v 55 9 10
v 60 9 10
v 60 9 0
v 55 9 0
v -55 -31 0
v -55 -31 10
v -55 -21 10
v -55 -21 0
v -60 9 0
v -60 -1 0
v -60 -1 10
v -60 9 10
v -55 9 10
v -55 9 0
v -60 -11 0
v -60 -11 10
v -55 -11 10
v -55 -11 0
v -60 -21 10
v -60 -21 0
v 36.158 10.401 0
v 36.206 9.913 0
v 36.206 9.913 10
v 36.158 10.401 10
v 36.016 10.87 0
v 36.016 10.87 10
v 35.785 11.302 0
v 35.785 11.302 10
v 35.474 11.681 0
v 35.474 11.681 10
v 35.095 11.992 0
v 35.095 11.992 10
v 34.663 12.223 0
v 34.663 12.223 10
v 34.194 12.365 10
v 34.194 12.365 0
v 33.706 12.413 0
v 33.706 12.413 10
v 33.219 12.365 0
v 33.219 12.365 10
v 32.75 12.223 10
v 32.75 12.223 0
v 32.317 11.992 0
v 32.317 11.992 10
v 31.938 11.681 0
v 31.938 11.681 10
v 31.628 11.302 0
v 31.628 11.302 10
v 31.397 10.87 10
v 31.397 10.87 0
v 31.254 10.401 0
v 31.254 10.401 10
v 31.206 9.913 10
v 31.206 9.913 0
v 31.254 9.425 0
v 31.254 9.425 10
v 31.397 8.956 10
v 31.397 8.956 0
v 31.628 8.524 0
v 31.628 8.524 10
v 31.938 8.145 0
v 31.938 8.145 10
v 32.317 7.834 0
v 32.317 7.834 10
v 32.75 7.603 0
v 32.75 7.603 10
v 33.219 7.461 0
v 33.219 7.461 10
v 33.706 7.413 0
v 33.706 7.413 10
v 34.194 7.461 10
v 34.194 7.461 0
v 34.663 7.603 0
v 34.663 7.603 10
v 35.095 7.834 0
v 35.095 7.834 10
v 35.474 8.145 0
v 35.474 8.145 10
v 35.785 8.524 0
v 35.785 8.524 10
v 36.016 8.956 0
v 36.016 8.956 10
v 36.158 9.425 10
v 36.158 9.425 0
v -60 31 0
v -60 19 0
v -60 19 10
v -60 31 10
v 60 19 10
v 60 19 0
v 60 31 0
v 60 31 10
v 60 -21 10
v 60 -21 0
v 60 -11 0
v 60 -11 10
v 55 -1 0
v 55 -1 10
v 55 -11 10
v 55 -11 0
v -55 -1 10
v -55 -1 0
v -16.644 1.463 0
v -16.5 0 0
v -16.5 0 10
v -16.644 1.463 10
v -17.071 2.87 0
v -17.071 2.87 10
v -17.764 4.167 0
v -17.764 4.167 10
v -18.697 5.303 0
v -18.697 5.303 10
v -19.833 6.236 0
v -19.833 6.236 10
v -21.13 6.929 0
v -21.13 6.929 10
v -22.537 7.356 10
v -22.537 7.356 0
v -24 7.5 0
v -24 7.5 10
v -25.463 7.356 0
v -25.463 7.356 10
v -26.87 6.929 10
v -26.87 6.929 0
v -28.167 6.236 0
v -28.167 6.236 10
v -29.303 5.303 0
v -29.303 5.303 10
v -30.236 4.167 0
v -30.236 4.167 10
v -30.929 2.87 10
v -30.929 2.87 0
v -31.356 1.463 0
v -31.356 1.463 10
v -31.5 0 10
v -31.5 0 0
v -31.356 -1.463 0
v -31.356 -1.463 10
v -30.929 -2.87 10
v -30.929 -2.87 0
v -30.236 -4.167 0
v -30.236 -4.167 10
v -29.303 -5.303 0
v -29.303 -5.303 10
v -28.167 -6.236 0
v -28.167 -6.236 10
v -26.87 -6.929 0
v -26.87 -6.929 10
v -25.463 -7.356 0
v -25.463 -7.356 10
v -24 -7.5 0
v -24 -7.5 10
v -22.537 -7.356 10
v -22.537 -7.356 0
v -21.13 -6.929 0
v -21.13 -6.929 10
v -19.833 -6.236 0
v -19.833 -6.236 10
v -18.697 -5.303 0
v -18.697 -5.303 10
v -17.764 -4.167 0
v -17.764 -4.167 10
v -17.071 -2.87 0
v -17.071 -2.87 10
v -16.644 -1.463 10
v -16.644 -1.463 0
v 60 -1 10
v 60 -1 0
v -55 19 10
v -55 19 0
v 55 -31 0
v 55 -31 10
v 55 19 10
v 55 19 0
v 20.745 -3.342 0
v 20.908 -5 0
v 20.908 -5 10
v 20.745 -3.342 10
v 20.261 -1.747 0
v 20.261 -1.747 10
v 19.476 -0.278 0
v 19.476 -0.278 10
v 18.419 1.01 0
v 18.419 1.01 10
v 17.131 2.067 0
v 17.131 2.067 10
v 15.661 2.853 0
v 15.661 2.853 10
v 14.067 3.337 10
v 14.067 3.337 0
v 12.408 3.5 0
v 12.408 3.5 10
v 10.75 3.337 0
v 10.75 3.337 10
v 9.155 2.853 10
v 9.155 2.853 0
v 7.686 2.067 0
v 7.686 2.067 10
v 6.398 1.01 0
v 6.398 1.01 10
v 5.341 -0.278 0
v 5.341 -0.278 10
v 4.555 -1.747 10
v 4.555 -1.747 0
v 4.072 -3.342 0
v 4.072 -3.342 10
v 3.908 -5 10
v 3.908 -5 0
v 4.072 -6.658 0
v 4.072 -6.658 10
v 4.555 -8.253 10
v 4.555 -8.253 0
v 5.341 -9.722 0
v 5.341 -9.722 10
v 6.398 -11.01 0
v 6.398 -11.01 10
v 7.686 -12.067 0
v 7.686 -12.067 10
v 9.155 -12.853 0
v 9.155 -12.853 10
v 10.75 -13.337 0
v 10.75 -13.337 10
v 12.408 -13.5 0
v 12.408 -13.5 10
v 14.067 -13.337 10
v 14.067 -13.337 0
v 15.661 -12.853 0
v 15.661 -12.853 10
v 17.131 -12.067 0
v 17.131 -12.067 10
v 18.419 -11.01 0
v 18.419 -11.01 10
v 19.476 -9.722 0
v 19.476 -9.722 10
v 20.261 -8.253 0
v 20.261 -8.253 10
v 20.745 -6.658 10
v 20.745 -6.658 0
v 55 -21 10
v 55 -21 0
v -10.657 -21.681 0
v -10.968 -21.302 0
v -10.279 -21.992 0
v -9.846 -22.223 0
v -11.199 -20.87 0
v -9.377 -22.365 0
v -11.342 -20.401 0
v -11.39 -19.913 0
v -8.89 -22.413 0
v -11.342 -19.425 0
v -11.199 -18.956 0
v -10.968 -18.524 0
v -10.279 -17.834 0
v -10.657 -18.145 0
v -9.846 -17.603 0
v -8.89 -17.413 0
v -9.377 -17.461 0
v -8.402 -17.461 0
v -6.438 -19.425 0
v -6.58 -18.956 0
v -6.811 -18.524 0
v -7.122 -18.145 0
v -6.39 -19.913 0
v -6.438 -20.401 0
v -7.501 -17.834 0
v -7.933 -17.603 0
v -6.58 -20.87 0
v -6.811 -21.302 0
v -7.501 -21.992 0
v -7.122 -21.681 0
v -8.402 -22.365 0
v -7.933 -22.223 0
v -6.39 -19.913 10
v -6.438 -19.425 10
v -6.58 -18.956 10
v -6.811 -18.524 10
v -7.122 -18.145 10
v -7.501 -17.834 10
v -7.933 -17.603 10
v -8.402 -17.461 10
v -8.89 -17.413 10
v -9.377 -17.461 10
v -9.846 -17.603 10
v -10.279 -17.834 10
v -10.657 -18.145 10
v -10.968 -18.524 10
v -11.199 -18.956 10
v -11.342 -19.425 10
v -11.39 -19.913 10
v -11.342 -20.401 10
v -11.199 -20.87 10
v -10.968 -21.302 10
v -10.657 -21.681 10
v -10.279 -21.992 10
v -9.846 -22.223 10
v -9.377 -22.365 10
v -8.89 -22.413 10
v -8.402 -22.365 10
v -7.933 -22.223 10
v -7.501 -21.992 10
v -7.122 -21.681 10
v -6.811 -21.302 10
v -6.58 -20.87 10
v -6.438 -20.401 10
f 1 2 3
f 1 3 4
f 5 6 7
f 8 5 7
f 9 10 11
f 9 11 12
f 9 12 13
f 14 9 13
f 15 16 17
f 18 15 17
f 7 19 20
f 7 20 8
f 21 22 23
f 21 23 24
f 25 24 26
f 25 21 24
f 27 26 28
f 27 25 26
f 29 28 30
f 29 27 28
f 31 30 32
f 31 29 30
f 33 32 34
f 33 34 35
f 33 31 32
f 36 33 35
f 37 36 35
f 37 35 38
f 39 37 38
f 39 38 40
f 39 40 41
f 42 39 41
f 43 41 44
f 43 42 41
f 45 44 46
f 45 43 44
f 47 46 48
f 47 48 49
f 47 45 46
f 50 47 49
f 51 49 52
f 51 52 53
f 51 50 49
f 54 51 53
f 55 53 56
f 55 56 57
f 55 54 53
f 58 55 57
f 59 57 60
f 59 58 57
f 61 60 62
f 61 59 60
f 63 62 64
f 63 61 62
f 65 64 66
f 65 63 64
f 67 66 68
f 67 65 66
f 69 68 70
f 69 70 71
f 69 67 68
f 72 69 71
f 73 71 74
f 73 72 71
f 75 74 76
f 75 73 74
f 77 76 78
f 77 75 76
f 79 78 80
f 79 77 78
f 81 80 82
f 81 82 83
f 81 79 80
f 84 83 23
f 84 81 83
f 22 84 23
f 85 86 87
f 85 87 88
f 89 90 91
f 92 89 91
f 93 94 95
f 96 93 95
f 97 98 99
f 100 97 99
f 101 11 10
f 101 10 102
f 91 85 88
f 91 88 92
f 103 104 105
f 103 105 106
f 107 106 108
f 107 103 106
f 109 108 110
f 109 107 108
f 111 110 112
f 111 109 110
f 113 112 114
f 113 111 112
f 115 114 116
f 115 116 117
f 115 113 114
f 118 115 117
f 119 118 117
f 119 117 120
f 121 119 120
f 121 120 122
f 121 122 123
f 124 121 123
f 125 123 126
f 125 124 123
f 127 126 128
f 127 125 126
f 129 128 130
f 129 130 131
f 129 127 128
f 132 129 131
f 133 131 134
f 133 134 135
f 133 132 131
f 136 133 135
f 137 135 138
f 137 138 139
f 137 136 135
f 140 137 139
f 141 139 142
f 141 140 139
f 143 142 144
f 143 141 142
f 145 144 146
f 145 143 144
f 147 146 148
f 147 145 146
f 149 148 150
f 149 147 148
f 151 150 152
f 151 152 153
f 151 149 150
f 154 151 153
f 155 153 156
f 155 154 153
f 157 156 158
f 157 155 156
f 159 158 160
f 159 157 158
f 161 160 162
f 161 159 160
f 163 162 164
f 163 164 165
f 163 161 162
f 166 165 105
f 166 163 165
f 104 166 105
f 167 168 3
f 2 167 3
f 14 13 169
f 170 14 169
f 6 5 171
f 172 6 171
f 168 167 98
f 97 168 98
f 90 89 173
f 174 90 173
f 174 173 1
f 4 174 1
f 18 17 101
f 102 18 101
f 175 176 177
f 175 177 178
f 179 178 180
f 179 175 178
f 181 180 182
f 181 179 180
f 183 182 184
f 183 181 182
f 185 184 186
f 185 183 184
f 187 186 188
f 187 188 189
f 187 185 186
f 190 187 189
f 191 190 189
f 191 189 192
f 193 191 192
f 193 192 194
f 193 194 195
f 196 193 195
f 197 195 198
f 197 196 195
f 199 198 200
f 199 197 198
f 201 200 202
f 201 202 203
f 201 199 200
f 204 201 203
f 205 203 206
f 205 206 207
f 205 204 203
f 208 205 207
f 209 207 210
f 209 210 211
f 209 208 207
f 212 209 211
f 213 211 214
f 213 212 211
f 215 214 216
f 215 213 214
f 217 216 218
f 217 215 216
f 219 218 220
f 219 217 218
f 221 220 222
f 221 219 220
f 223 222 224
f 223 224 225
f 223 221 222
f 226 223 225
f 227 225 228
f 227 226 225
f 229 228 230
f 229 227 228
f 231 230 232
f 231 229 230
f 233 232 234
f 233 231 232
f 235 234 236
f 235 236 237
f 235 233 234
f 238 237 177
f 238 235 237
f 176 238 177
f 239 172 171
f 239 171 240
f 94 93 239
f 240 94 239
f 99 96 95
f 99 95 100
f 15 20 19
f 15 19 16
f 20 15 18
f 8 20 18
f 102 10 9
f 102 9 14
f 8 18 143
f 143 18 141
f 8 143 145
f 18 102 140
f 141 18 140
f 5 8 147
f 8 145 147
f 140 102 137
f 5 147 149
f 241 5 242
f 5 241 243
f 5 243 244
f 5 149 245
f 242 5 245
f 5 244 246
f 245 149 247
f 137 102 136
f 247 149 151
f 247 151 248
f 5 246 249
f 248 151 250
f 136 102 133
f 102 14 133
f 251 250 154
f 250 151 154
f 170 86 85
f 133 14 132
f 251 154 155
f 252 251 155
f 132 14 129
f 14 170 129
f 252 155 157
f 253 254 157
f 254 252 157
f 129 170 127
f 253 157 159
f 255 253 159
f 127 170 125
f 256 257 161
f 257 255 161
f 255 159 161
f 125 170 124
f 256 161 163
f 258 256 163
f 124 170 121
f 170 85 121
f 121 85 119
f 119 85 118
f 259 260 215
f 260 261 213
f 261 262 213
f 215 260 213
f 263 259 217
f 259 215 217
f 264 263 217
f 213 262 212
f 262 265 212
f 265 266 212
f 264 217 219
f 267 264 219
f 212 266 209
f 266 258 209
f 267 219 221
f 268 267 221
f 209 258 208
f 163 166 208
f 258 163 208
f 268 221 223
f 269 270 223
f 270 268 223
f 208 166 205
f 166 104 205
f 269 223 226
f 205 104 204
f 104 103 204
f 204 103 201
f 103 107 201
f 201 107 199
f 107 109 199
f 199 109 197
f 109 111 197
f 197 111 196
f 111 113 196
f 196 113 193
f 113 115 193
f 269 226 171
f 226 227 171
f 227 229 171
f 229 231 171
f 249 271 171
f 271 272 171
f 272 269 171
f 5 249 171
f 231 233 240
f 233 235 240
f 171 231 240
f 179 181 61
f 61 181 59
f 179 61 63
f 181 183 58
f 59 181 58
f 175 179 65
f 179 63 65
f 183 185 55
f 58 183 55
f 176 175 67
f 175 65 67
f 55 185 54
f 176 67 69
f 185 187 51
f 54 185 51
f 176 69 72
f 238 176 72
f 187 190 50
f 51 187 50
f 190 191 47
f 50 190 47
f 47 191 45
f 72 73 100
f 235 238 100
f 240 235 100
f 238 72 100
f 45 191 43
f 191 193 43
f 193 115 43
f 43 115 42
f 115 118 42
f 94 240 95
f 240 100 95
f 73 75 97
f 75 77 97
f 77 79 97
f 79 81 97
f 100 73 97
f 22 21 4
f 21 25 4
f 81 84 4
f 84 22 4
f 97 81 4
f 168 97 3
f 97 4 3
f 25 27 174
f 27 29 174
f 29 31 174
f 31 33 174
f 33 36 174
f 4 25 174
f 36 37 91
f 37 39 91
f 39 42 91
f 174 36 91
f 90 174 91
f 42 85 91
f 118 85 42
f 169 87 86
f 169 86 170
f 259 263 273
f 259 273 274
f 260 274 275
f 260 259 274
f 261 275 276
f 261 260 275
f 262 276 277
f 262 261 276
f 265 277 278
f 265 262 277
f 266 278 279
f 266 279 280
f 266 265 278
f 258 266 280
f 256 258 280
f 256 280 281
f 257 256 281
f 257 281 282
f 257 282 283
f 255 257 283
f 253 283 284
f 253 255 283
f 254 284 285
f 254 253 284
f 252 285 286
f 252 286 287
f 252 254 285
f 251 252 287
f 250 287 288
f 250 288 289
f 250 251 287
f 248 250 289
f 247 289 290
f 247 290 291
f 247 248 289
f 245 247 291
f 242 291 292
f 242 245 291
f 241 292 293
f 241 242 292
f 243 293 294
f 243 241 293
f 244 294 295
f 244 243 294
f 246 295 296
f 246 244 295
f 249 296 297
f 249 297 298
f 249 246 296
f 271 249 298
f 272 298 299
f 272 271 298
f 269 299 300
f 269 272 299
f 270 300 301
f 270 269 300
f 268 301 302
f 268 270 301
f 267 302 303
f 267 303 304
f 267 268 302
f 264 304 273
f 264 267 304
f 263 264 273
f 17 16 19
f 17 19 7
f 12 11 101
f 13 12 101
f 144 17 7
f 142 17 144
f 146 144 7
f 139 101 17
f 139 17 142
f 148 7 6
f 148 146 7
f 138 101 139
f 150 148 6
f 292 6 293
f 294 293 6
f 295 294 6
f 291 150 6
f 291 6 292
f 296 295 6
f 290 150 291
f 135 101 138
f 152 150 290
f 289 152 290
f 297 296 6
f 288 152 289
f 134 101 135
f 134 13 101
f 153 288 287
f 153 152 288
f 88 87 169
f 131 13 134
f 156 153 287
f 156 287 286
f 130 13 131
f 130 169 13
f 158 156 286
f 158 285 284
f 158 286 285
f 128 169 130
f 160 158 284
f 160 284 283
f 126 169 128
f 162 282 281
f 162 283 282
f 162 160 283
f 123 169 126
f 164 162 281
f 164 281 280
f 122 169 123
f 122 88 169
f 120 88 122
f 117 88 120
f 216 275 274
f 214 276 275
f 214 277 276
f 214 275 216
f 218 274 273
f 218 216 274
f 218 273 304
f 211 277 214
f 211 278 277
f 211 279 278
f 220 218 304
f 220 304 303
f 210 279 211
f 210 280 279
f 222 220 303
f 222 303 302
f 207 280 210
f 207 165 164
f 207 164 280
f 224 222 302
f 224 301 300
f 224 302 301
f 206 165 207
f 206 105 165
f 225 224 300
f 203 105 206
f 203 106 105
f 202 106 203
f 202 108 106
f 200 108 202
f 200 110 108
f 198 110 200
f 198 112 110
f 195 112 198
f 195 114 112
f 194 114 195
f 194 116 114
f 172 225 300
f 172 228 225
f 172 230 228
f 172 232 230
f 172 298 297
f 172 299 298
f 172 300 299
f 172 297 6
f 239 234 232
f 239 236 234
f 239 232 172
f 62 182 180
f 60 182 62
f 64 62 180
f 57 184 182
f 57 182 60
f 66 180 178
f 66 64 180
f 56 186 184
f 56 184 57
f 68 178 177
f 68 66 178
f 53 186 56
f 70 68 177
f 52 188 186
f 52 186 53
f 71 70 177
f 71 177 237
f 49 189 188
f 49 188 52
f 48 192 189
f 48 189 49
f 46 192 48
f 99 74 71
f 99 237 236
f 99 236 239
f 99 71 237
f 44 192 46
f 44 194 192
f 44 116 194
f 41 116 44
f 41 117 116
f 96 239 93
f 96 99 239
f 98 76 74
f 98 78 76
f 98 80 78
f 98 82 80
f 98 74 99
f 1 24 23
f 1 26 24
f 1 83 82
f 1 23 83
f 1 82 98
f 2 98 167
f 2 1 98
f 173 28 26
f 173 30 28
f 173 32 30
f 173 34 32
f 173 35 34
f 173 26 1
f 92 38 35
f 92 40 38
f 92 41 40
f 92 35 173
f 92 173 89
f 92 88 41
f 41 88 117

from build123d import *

# Parameters (mm, degrees)
SKETCH_2_W               = 120
SKETCH_2_H               = 62
SKETCH_2_R               = 8.5
SKETCH_2_R_2             = 7.5
SKETCH_2_R_3             = 2.5
EXTRUDE_1_DEPTH          = 10
CUT_EXTRUDE_1_REACH      = 70.272
SKETCH_3_W               = 5
SKETCH_3_H               = 10
PATTERN_LINEAR_1_COUNT   = 3
PATTERN_LINEAR_1_PITCH   = 20
MIRROR_1_COPY_1_REACH    = 70.272
MIRROR_1_COPY_1_SKETCH_W = 5
MIRROR_1_COPY_1_SKETCH_H = 10
MIRROR_1_COPY_2_REACH    = 70.272
MIRROR_1_COPY_2_SKETCH_W = 5
MIRROR_1_COPY_2_SKETCH_H = 10


with BuildPart() as part:
    # 스케치2 → 보스-돌출1 (new body)
    with BuildSketch(Plane.XY):
        Rectangle(SKETCH_2_W, SKETCH_2_H)
        with Locations((12.408275183, -5)):
            Circle(SKETCH_2_R, mode=Mode.SUBTRACT)
        with Locations((-24, 0)):
            Circle(SKETCH_2_R_2, mode=Mode.SUBTRACT)
        with Locations((33.706228335, 9.912987345)):
            Circle(SKETCH_2_R_3, mode=Mode.SUBTRACT)
        with Locations((-8.889677969, -19.912987345)):
            Circle(SKETCH_2_R_3, mode=Mode.SUBTRACT)
    extrude(amount=EXTRUDE_1_DEPTH)

    # 스케치3 → 컷-돌출1 (cut, up to next)
    with BuildSketch(Plane.XY.offset(10), mode=Mode.PRIVATE) as cut_extrude_1_sk1:
        with Locations((-57.5, -26)):
            Rectangle(SKETCH_3_W, SKETCH_3_H)
    cut_extrude_1_tool1 = extrude(cut_extrude_1_sk1.sketch, amount=-CUT_EXTRUDE_1_REACH, mode=Mode.PRIVATE) & part.part
    cut_extrude_1 = cut_extrude_1_tool1.solids().sort_by_distance((-57.5, -26, 10))[0]
    add(cut_extrude_1, mode=Mode.SUBTRACT)

    # 선형 패턴1: 컷-돌출1 ×3
    with Locations(*[(0, i * PATTERN_LINEAR_1_PITCH, 0) for i in range(1, PATTERN_LINEAR_1_COUNT)]):
        add(cut_extrude_1, mode=Mode.SUBTRACT)

    # 대칭 복사1: 컷-돌출1 across plane
    add(cut_extrude_1.mirror(Plane(origin=(0, 0, 0), x_dir=(0, 0, 1), z_dir=(1, 0, 0))), mode=Mode.SUBTRACT)

    # 대칭 복사1 copy 1 sketch → 대칭 복사1 copy 1 (cut, up to next)
    with BuildSketch(Plane(origin=(0, 20, 10), x_dir=(-1, 0, 0), z_dir=(0, 0, 1)), mode=Mode.PRIVATE) as mirror_1_copy_1_sk1:
        with Locations((-57.5, 26)):
            Rectangle(MIRROR_1_COPY_1_SKETCH_W, MIRROR_1_COPY_1_SKETCH_H)
    mirror_1_copy_1_tool1 = extrude(mirror_1_copy_1_sk1.sketch, amount=-MIRROR_1_COPY_1_REACH, mode=Mode.PRIVATE) & part.part
    add(mirror_1_copy_1_tool1.solids().sort_by_distance((57.5, -6, 10))[0], mode=Mode.SUBTRACT)

    # 대칭 복사1 copy 2 sketch → 대칭 복사1 copy 2 (cut, up to next)
    with BuildSketch(Plane(origin=(0, 40, 10), x_dir=(-1, 0, 0), z_dir=(0, 0, 1)), mode=Mode.PRIVATE) as mirror_1_copy_2_sk1:
        with Locations((-57.5, 26)):
            Rectangle(MIRROR_1_COPY_2_SKETCH_W, MIRROR_1_COPY_2_SKETCH_H)
    mirror_1_copy_2_tool1 = extrude(mirror_1_copy_2_sk1.sketch, amount=-MIRROR_1_COPY_2_REACH, mode=Mode.PRIVATE) & part.part
    add(mirror_1_copy_2_tool1.solids().sort_by_distance((57.5, 14, 10))[0], mode=Mode.SUBTRACT)


solid = part.part
